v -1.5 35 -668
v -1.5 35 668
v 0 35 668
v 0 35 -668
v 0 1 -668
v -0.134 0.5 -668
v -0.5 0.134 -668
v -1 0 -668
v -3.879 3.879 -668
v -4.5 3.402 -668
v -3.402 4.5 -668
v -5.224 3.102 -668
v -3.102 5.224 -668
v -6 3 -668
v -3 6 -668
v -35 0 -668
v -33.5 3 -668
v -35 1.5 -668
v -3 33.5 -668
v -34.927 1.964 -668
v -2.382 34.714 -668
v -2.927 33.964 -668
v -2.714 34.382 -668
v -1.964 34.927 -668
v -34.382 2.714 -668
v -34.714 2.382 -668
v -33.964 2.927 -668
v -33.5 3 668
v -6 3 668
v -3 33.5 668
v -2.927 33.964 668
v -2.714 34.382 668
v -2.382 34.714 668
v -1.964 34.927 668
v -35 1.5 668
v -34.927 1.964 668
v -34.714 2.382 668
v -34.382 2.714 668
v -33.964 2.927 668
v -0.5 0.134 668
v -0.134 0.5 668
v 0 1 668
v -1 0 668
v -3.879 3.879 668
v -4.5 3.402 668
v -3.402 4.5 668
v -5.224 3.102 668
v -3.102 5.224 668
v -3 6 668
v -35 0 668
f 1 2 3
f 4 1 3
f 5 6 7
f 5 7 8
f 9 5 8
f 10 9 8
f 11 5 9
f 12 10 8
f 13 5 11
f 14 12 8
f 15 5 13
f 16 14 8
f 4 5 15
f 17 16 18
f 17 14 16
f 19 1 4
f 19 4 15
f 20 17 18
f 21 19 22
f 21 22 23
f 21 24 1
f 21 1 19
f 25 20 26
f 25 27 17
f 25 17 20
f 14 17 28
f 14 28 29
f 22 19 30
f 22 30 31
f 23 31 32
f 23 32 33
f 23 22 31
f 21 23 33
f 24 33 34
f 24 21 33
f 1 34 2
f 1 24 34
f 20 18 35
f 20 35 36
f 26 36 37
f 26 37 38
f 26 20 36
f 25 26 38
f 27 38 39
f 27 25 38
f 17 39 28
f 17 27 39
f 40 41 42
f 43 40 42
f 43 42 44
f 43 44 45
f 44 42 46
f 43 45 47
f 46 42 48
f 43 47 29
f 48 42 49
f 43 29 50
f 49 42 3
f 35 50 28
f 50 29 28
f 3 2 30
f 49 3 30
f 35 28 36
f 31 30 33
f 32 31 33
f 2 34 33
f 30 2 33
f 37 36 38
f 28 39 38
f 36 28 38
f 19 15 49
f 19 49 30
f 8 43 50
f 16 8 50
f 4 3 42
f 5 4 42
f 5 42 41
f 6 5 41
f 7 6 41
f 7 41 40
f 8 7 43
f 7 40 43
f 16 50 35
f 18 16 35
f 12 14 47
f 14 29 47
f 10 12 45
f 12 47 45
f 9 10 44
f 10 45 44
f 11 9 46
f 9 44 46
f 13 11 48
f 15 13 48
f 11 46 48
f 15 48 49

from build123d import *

# Parameters (mm, degrees)
BOSS_EXTRUDE1_DEPTH = 668
FILLET1_R           = 1.5


with BuildPart() as part:
    # Sketch1 → Boss-Extrude1 (new body)
    with BuildSketch(Plane.XY):
        with BuildLine():
            Line((-1, 0), (-35, 0))
            Line((-35, 0), (-35, 3))
            Line((-35, 3), (-6, 3))
            ThreePointArc((-6, 3), (-3.878679656, 3.878679656), (-3, 6))
            Line((-3, 6), (-3, 35))
            Line((-3, 35), (0, 35))
            Line((0, 35), (0, 1))
            ThreePointArc((0, 1), (-0.292893219, 0.292893219), (-1, 0))
        make_face()
    extrude(amount=BOSS_EXTRUDE1_DEPTH)

    # Fillet1
    fillet1_edges = [part.edges().sort_by_distance(p)[0] for p in [
        (-35, 3, 334),
        (-3, 35, 334),
    ]]
    fillet(fillet1_edges, radius=FILLET1_R)

    # Mirror4: part across plane


with BuildPart() as part_1:
    add(part.part)
    add(part.part.mirror(Plane.XY))


solid = part_1.part
